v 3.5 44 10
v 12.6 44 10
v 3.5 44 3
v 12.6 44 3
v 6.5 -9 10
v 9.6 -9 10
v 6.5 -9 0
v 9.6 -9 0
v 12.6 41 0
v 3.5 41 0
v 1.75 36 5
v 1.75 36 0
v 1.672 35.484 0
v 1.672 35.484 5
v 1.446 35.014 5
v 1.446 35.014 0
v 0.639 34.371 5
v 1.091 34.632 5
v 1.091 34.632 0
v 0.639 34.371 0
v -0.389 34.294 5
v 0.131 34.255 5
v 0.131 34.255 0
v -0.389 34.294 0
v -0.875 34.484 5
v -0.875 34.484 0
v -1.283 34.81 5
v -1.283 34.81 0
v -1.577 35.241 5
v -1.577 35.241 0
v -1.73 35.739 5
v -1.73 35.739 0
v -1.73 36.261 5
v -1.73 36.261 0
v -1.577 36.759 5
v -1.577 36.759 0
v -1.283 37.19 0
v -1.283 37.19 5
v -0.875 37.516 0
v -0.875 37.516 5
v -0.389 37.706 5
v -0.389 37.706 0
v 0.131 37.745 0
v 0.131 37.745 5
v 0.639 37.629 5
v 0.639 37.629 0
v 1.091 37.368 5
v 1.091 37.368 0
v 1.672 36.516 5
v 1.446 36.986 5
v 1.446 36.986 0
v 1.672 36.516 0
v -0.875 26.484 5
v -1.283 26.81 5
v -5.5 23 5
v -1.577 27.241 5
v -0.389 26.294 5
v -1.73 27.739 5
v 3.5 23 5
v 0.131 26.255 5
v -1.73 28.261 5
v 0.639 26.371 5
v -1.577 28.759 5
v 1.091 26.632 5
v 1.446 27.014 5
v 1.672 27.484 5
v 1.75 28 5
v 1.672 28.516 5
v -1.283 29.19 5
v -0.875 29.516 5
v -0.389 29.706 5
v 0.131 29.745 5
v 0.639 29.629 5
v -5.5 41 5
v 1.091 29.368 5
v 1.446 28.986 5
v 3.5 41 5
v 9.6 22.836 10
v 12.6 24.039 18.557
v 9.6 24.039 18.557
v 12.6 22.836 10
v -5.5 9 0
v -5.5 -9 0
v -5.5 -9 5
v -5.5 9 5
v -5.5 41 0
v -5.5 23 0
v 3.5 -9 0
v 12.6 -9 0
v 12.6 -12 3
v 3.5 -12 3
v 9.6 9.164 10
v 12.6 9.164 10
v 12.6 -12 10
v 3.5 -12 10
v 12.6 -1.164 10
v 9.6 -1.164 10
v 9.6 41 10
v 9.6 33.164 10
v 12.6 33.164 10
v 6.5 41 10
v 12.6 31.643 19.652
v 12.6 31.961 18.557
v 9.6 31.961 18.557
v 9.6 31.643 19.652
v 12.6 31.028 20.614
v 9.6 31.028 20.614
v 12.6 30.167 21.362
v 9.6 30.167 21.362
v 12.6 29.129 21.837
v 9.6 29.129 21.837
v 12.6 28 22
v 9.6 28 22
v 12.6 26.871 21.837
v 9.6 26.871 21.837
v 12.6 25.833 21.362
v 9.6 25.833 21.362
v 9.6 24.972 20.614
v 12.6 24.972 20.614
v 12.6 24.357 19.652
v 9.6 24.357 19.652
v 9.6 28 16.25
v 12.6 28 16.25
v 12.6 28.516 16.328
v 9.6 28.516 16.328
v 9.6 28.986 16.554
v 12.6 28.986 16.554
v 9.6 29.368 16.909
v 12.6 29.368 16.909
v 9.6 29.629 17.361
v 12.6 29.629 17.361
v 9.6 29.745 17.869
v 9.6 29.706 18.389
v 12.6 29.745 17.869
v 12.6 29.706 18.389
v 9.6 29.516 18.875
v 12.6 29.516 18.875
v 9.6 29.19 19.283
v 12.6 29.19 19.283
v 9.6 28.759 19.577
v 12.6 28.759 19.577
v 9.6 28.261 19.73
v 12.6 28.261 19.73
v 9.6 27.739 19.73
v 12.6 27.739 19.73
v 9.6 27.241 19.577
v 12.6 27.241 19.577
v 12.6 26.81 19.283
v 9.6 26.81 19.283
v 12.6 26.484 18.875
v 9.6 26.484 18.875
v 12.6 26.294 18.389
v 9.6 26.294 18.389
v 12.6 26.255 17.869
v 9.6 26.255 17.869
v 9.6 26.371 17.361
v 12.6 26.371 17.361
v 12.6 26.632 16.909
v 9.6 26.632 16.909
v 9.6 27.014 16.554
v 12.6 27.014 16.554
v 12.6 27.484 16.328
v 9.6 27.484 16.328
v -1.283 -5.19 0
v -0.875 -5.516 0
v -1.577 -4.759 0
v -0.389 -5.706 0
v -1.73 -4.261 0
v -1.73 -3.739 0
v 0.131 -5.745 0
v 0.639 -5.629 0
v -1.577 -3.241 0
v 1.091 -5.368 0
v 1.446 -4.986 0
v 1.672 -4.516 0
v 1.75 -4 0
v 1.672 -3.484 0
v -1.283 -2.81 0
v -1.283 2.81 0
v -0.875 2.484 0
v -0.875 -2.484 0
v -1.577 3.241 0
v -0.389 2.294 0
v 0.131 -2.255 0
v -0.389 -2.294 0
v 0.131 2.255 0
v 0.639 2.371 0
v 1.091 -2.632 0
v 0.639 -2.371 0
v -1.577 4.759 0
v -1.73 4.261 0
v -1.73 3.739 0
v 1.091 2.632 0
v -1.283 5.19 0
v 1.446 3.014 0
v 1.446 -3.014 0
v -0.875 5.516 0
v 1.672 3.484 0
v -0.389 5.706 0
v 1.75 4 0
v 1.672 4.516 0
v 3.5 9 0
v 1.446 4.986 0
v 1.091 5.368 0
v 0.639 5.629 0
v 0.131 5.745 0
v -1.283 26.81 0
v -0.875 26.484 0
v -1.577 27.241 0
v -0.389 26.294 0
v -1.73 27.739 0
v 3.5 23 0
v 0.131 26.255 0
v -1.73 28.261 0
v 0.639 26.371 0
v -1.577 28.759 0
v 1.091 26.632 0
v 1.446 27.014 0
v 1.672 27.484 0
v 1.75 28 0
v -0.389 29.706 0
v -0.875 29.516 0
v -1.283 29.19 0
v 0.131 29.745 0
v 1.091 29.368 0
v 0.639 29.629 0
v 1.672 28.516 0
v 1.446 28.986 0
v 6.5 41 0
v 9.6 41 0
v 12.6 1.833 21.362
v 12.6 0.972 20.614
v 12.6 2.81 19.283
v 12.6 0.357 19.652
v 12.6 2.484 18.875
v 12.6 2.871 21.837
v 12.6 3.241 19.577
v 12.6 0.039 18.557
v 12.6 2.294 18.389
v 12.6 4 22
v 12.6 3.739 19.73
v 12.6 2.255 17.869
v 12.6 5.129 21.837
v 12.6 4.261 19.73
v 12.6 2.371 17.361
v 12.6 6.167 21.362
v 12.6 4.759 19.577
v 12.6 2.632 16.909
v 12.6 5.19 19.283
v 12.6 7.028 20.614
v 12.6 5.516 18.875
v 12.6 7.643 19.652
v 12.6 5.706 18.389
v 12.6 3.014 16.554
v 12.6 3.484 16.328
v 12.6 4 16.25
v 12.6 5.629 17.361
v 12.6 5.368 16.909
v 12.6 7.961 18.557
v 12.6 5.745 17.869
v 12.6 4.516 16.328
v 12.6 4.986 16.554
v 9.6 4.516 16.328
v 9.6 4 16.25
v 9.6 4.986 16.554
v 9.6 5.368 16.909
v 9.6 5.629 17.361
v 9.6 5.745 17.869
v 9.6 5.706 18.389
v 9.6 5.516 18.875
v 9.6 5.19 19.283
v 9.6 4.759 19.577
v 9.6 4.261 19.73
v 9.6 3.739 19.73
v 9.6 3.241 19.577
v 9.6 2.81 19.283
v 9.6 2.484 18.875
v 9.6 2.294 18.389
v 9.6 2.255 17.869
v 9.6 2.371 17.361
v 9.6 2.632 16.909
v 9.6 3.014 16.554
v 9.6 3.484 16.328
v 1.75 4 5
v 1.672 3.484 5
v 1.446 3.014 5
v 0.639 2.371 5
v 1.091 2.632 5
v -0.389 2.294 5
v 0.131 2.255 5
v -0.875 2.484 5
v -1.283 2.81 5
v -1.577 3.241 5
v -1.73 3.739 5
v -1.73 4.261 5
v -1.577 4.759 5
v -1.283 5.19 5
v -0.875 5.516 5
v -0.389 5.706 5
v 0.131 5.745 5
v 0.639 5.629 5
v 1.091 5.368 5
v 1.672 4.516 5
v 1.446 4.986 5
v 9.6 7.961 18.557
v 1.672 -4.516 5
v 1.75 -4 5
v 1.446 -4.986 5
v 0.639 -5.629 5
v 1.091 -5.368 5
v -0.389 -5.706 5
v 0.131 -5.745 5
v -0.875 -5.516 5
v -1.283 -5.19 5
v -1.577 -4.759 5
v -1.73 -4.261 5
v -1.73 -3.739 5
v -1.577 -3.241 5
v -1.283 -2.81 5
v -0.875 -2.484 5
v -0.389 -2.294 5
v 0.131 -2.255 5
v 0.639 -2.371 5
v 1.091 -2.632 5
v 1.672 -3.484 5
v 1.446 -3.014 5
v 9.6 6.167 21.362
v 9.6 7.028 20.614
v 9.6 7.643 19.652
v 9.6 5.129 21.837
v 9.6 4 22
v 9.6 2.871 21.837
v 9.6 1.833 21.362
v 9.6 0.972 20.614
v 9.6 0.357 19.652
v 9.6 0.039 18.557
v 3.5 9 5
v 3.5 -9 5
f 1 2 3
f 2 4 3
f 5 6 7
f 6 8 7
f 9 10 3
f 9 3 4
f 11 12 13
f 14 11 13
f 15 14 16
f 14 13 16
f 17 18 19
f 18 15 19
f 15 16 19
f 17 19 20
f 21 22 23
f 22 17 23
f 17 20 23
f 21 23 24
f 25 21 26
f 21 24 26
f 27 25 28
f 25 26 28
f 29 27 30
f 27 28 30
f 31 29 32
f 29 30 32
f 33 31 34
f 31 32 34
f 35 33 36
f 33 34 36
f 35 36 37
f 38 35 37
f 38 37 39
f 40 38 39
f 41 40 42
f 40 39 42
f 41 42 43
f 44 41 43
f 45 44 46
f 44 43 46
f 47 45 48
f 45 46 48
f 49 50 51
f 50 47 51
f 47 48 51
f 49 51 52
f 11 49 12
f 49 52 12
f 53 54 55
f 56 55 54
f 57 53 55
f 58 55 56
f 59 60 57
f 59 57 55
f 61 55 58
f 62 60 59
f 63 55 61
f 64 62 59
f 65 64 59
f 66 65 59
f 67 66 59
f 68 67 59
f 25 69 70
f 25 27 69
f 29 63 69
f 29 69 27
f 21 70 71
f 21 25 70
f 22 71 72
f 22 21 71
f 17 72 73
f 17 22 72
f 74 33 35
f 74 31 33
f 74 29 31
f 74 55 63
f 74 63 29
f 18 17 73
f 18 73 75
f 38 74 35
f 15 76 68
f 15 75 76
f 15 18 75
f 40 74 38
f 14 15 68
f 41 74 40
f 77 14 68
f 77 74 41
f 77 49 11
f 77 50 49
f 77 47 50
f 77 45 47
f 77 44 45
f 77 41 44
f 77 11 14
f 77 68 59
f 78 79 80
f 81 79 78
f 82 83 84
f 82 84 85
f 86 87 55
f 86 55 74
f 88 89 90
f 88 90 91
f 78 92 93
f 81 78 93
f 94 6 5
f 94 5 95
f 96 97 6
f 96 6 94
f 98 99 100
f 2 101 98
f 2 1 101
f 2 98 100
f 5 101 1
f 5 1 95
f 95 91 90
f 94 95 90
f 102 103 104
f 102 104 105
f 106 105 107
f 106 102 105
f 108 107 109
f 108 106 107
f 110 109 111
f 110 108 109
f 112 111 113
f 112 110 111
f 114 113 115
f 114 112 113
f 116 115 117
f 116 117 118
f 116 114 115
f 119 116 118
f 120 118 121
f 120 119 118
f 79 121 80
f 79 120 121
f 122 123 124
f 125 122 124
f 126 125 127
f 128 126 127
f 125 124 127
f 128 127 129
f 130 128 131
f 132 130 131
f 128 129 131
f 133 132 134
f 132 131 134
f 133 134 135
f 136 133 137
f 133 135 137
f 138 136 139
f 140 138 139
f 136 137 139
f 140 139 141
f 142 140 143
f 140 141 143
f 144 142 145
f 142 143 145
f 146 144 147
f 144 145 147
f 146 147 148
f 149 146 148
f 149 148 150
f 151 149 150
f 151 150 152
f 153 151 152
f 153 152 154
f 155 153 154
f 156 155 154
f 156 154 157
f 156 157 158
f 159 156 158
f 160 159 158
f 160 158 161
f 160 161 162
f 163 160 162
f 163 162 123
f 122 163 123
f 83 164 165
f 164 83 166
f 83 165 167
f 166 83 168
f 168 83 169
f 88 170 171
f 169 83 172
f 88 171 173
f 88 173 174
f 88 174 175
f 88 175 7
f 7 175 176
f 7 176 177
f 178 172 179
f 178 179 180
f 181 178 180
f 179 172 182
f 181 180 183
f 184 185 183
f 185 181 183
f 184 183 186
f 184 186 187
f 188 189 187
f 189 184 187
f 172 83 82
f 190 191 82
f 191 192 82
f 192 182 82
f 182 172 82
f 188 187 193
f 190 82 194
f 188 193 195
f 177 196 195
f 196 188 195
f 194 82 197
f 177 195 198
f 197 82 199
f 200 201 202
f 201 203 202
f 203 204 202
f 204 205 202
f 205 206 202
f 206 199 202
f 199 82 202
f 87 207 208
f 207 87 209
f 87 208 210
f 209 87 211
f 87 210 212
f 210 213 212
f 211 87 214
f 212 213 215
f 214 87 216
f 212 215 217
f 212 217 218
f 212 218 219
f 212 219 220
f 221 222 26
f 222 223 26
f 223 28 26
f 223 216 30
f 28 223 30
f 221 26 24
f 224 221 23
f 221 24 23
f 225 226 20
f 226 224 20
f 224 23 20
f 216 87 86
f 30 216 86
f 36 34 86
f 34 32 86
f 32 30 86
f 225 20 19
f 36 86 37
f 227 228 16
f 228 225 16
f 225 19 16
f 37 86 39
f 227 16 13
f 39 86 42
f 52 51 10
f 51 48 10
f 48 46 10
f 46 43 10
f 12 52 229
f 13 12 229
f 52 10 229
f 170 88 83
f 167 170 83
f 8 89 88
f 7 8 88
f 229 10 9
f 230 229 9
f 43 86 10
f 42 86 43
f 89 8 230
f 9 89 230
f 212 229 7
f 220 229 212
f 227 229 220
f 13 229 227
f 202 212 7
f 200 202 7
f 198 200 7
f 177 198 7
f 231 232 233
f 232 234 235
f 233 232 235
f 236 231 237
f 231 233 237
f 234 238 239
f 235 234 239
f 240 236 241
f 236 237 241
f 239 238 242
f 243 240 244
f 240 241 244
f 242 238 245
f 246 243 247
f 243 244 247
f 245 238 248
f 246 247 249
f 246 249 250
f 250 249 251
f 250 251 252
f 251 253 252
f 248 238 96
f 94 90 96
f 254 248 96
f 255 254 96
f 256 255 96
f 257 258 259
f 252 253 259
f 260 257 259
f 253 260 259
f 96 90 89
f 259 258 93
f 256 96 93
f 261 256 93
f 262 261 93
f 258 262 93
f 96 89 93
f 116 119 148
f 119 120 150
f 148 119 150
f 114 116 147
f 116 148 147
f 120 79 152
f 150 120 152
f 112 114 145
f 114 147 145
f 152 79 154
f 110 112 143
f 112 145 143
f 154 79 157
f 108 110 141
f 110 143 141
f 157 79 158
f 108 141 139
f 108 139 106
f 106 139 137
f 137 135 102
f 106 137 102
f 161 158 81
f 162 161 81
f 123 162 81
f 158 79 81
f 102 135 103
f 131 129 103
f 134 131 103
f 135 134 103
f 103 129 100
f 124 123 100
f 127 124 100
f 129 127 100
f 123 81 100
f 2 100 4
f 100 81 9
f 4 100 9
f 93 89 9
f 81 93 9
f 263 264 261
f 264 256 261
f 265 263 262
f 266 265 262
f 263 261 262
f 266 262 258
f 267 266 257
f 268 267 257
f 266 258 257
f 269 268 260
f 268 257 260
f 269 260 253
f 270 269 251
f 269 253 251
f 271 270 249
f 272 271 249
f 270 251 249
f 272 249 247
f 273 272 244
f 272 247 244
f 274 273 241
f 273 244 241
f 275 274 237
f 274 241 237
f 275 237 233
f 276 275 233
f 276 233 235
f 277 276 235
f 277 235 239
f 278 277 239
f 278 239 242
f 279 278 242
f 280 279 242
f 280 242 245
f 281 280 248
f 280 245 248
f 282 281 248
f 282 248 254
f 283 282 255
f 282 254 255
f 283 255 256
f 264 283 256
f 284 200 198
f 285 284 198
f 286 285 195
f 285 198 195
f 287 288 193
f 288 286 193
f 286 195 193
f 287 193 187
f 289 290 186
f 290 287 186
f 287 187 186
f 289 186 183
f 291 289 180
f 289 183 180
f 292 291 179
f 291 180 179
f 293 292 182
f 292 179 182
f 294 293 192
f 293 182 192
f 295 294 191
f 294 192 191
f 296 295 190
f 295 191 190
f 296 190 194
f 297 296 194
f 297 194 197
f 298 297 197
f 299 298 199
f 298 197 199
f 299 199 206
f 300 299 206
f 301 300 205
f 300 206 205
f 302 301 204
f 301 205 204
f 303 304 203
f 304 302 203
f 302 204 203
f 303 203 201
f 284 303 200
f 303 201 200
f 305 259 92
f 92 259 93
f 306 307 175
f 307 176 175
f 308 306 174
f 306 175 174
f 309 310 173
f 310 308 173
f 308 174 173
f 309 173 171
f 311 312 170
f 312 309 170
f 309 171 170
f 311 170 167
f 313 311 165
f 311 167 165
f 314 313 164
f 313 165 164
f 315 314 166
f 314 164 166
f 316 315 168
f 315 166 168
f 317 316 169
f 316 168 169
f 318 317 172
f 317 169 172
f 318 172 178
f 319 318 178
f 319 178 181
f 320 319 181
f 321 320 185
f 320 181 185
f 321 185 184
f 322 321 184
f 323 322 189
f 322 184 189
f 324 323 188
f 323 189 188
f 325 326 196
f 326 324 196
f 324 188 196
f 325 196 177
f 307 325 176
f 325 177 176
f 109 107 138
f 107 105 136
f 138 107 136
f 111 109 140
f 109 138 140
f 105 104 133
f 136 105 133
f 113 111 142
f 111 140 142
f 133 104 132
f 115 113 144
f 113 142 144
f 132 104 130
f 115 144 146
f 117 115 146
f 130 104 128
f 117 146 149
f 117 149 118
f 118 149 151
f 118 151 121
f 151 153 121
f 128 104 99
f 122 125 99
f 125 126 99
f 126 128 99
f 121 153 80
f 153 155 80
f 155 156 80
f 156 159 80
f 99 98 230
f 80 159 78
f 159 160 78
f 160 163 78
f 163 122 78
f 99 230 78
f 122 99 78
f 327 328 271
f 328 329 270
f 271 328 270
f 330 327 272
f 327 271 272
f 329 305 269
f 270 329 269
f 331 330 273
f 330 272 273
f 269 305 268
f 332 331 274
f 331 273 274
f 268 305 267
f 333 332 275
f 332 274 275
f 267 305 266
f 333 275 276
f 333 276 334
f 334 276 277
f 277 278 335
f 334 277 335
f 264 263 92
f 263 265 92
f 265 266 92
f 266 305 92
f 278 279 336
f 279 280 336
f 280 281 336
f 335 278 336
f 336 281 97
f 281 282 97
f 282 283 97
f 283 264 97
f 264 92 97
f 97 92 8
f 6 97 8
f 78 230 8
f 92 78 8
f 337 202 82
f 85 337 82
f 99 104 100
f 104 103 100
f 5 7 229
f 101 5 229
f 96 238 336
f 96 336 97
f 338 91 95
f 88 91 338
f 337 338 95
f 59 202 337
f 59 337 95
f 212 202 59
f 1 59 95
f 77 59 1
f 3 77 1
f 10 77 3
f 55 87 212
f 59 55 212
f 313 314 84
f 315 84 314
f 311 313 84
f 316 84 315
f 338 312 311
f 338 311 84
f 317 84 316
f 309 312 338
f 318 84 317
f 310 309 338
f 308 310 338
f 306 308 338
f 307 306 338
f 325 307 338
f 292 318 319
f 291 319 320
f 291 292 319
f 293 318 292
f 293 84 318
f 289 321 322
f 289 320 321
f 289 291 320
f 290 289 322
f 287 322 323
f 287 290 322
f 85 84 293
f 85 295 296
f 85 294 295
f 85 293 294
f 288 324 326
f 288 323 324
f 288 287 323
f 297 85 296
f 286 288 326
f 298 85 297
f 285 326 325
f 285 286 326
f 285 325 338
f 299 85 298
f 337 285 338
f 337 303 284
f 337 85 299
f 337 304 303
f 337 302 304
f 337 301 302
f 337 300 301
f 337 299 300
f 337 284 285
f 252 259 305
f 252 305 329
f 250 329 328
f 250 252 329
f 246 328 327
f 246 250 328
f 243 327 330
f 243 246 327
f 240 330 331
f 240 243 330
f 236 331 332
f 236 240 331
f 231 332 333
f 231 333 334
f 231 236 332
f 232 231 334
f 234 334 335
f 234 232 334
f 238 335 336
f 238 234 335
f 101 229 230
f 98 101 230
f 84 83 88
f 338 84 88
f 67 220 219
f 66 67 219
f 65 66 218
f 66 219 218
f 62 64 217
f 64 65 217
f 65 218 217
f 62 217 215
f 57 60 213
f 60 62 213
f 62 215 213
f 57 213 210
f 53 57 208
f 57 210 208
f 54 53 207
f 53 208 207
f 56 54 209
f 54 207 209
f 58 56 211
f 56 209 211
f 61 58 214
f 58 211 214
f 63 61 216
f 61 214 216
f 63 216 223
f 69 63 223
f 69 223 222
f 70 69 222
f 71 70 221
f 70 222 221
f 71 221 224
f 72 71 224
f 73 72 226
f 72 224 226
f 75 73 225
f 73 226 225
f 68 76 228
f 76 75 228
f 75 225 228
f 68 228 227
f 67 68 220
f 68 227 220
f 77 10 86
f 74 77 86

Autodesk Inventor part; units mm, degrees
ref_plane "YZ Plane" through (0, 0, 0) normal (1, 0, 0) x (0, 1, 0)
ref_plane "XZ Plane" through (0, 0, 0) normal (0, 1, 0) x (-1, 0, 0)
ref_plane "XY Plane" through (0, 0, 0) normal (0, 0, 1) x (1, 0, 0)
sketch "Sketch1" plane through (0, 0, 0) normal (0, 0, 1) x (1, 0, 0)
  arc A0 (5.5, 7) -> (3.5, 9) centre (3.5, 7) ccw projected
  line L0 (3.5, 9) -> (-5.5, 9) projected
  line L1 (-5.5, -9) -> (-5.5, 9) projected
  line L2 (-5.5, -9) -> (3.5, -9) projected
  arc A1 (3.5, -9) -> (5.5, -7) centre (3.5, -7) ccw projected
  line L3 (5.5, -7) -> (5.5, 7) projected
  circle A2 centre (0, 4) radius 2.25 construction
  circle A3 centre (0, -4) radius 2.25 construction
  arc A4 (5.5, 39) -> (3.5, 41) centre (3.5, 39) ccw projected
  line L4 (3.5, 41) -> (-5.5, 41) projected
  line L5 (-5.5, 23) -> (-5.5, 41) projected
  line L6 (-5.5, 23) -> (3.5, 23) projected
  arc A5 (3.5, 23) -> (5.5, 25) centre (3.5, 25) ccw projected
  line L7 (5.5, 25) -> (5.5, 39) projected
  circle A6 centre (0, 36) radius 2.25 construction
  circle A7 centre (0, 28) radius 2.25 construction
  circle A8 centre (0, 4) radius 1.75
  circle A9 centre (0, -4) radius 1.75
  circle A10 centre (0, 28) radius 1.75
  circle A11 centre (0, 36) radius 1.75
  line L8 (6.4713, 13.5) -> (-5.5, 13.5) construction
  line L9 (-5.5, 18.5) -> (6.4713, 18.5) construction
  line L10 (6.5, -9) -> (9.6, -9)
  line L11 (9.6, -9) -> (9.6, 41)
  line L12 (9.6, 41) -> (6.5, 41)
  line L13 (6.5, 41) -> (6.5, -9)
  line L14 (-1, 9) -> (-1, 23) construction
  line L15 (-1, 16) -> (6.5, 16) construction
  line L16 (3.5, -12) -> (12.6, -12)
  line L17 (12.6, -12) -> (12.6, 44)
  line L18 (12.6, 44) -> (3.5, 44)
  line L19 (3.5, 44) -> (3.5, -12)
  point P0 (0, 0)
  dimension "d0" = 3.5
  dimension "d1" = 3.5
  dimension "d2" = 3.5
  dimension "d3" = 3.5
  dimension "d4" = 3.1
  dimension "d5" = 50
  dimension "d7" = 3
extrude "Extrusion1" add sketch "Sketch1" along normal blind 5
sketch "Sketch2" plane through (0, 0, 5) normal (0, 0, 1) x (1, 0, 0)
  line L0 (12.6, 44) -> (3.5, 44) projected
  line L1 (3.5, -12) -> (12.6, -12) projected
  line L2 (12.6, -12) -> (12.6, 44) projected
  line L3 (12.6, -12) -> (3.5, -12)
  line L4 (3.5, -12) -> (3.5, 44)
  line L5 (3.5, 44) -> (12.6, 44)
  line L6 (12.6, 44) -> (12.6, -12)
  line L7 (6.5, -9) -> (6.5, 41) projected
  line L8 (9.6, -9) -> (6.5, -9) projected
  line L9 (6.5, 41) -> (9.6, 41)
  line L10 (9.6, 41) -> (9.6, -9)
  line L11 (9.6, -9) -> (6.5, -9)
  line L12 (6.5, -9) -> (6.5, 41)
  point P0 (0, 0)
extrude "Extrusion2" add sketch "Sketch2" along normal blind 5
sketch "Sketch3" plane through (12.6, -12, 0) normal (1, 0, 0) x (0, 0, -1)
  circle A0 centre (-18, 40) radius 1.75
  arc A1 (-18.5567, 43.9611) -> (-18.5567, 36.0389) centre (-18, 40) ccw
  line L0 (-18.5567, 36.0389) -> (-10, 34.8364)
  line L1 (-10, 0) -> (-10, 56) projected
  line L2 (-18.5567, 43.9611) -> (-10, 45.1636)
  line L3 (-18, 40) -> (-10, 40) construction
  line L4 (-33.1913, 28) -> (0, 28)
  line L5 (0, 0) -> (0, 56) projected
  circle A2 centre (-18, 16) radius 1.75
  arc A3 (-18.5567, 19.9611) -> (-18.5567, 12.0389) centre (-18, 16) ccw
  line L6 (-18.5567, 19.9611) -> (-10, 21.1636)
  line L7 (-18.5567, 12.0389) -> (-10, 10.8364)
  line L8 (-18, 16) -> (-10, 16) construction
  point P0 (0, 12)
  point P1 (-14, 40)
  point P2 (-10, 28)
  point P3 (-10, 28)
  point P4 (-14, 16)
  dimension "d12" = 3.5
  dimension "d13" = 8
  dimension "d14" = 8
  dimension "d15" = 4
  dimension "d16" = 8
  dimension "d17" = 12
extrude "Extrusion3" add sketch "Sketch3" against normal up to surface (3 mm away)
sketch "Sketch4" plane through (0, 0, 5) normal (0, 0, 1) x (1, 0, 0)
  point P0 (0, 0)
chamfer "Chamfer1" distance 3 angle 45 2 edges at (8.05, 44, 0) (8.05, -12, 0)
properties part number "Lysekrone_adapter"
